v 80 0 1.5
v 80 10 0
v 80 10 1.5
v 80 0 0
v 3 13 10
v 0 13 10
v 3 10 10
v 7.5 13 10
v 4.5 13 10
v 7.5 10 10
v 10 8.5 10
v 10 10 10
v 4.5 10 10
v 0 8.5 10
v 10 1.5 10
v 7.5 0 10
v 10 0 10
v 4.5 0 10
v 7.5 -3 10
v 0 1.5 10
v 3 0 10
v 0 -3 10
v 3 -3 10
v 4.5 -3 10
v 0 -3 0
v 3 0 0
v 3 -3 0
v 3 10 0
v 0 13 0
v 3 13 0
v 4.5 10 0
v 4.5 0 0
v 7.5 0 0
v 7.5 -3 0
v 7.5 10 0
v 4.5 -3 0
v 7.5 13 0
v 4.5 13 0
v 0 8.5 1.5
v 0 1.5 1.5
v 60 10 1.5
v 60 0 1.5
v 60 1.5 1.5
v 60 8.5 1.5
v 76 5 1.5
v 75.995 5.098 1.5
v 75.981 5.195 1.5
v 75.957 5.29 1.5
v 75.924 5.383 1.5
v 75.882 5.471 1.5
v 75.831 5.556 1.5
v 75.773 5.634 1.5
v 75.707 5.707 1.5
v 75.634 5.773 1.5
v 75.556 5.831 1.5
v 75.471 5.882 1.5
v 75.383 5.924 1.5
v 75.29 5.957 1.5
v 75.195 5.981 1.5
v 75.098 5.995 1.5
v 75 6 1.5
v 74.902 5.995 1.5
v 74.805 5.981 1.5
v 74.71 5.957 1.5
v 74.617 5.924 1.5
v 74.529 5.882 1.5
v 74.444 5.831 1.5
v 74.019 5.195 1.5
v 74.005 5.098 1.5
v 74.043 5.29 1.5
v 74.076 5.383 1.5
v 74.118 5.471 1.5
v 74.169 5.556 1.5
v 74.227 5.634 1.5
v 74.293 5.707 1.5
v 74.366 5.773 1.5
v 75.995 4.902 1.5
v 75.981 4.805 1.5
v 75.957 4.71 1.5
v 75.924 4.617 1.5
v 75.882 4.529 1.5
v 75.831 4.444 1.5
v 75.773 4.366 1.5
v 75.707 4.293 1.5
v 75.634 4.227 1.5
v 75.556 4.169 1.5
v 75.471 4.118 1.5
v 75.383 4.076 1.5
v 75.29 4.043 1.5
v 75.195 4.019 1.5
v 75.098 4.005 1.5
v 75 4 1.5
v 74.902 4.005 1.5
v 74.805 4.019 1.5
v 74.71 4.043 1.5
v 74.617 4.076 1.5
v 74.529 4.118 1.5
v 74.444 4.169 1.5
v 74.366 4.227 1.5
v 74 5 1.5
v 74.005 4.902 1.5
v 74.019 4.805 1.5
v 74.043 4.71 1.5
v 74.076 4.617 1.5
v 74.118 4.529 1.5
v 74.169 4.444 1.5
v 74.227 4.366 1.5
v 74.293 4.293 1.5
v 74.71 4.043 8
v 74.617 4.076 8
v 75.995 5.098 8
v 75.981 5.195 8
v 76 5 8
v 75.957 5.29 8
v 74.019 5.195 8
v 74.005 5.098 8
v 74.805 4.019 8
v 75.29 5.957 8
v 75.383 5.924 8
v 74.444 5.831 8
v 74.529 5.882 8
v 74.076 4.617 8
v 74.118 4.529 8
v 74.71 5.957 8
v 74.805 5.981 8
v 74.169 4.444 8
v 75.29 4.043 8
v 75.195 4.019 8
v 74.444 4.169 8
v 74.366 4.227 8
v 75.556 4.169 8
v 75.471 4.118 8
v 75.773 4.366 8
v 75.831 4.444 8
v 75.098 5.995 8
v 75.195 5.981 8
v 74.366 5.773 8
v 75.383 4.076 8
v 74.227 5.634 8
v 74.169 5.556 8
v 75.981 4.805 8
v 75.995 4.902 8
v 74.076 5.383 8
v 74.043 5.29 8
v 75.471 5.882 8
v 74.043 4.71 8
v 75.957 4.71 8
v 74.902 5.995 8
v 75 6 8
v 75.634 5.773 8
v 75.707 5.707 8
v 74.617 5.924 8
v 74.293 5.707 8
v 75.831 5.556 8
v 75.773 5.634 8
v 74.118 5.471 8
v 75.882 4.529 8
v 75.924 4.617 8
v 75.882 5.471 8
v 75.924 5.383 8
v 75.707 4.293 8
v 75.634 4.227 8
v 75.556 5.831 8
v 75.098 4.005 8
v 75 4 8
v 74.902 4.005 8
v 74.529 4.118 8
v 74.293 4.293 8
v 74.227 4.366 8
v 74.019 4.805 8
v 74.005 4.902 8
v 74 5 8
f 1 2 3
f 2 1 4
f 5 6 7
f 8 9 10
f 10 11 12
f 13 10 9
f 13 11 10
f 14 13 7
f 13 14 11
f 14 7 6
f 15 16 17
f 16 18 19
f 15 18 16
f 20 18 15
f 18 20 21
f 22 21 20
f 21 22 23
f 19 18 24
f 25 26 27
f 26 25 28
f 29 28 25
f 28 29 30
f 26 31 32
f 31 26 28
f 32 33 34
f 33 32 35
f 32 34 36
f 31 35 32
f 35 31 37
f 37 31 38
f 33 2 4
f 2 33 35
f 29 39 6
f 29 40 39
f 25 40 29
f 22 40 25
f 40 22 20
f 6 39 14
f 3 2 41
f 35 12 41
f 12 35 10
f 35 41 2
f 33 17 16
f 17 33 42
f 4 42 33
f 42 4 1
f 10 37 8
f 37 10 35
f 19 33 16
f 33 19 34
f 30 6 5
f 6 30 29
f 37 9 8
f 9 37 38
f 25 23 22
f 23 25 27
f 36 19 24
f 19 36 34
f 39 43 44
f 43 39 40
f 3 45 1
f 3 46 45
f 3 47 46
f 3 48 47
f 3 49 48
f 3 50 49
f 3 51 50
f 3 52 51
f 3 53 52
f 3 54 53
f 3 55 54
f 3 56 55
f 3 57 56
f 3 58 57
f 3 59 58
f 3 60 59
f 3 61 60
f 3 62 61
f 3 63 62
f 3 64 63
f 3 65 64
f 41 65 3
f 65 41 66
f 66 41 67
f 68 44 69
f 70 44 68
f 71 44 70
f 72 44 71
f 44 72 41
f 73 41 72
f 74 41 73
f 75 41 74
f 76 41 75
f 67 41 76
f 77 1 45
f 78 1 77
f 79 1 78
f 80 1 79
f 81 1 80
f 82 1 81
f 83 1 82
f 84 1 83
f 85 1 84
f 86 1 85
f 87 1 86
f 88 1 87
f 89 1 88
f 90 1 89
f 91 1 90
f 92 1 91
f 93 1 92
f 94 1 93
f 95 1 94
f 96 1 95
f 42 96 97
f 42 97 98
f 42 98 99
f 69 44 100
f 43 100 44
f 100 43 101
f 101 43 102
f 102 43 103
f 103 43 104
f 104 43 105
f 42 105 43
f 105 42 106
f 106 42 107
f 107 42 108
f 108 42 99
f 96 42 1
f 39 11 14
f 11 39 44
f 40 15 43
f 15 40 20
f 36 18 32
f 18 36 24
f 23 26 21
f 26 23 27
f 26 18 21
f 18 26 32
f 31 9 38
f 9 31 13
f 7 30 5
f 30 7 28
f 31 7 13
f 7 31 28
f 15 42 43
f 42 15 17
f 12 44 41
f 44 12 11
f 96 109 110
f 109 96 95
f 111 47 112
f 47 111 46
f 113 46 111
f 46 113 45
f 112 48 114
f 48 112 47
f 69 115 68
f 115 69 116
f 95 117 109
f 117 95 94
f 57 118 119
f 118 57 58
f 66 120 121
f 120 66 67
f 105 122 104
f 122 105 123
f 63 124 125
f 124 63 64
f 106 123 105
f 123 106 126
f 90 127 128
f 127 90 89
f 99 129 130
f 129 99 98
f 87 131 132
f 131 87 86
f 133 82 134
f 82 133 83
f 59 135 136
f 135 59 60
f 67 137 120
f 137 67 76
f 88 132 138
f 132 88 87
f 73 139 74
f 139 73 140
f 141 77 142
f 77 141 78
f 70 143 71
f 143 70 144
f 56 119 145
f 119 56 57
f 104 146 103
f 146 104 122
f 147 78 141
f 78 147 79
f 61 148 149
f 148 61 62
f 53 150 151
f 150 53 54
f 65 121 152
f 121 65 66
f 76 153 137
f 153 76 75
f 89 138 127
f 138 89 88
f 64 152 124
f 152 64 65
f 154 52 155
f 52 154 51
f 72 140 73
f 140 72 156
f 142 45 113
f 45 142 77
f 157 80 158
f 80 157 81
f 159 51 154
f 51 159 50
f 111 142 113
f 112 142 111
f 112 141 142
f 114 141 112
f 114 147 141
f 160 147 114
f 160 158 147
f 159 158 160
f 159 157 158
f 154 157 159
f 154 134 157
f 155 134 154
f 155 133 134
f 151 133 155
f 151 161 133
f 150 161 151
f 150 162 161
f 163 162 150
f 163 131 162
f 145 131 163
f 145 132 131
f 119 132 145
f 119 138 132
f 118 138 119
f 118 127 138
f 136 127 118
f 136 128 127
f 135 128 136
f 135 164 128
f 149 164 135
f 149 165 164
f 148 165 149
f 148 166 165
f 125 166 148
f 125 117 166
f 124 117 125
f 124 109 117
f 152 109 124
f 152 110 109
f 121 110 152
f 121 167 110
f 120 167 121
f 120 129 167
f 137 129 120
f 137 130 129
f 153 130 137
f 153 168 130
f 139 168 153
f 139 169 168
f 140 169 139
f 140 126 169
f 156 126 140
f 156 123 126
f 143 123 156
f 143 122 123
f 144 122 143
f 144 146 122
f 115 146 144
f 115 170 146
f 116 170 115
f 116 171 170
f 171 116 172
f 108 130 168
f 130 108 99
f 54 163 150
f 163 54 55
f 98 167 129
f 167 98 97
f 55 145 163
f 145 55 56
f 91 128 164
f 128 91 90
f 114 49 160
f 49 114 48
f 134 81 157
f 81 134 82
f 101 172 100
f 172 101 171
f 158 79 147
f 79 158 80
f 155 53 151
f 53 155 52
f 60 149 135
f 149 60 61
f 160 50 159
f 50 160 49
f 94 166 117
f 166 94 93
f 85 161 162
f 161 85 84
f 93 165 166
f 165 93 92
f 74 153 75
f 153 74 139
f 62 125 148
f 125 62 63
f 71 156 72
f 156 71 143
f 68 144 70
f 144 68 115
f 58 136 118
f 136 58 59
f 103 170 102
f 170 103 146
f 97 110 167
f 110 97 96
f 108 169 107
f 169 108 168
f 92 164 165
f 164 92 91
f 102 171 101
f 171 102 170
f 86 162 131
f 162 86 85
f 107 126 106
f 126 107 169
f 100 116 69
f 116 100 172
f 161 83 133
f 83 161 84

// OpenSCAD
//tloustka plastu
t = 1.5;
//presah uchyceni
p = 3;

delka = 80;
sirka = 10;

//čep
vyska_cepu = 8;
prumer_cepu = 2;

$fn = 64;


difference() {
    union(){
        cube([delka,sirka,sirka]);
        translate([0,-p,0])
        cube([7.5,sirka+2*p,10]);
    }
    union() {
        translate([0,t,t])
        cube([delka,sirka-2*t,sirka]);
        
        translate([3,-p,0])
        cube([1.5,p,sirka]);
        
        translate([3,sirka,0])
        cube([1.5,p,sirka]);
        
        translate([0,sirka,0])
        rotate([90,0,0])
        linear_extrude(sirka)
        polygon([[sirka,sirka], [delka*3/4,sirka], [delka*3/4,t]]);
        
        translate([delka*3/4,0,t])
        cube([delka/4,sirka,sirka]);
    }
}

translate([delka-sirka/2,sirka/2,0])
cylinder(h=vyska_cepu,d=prumer_cepu);
